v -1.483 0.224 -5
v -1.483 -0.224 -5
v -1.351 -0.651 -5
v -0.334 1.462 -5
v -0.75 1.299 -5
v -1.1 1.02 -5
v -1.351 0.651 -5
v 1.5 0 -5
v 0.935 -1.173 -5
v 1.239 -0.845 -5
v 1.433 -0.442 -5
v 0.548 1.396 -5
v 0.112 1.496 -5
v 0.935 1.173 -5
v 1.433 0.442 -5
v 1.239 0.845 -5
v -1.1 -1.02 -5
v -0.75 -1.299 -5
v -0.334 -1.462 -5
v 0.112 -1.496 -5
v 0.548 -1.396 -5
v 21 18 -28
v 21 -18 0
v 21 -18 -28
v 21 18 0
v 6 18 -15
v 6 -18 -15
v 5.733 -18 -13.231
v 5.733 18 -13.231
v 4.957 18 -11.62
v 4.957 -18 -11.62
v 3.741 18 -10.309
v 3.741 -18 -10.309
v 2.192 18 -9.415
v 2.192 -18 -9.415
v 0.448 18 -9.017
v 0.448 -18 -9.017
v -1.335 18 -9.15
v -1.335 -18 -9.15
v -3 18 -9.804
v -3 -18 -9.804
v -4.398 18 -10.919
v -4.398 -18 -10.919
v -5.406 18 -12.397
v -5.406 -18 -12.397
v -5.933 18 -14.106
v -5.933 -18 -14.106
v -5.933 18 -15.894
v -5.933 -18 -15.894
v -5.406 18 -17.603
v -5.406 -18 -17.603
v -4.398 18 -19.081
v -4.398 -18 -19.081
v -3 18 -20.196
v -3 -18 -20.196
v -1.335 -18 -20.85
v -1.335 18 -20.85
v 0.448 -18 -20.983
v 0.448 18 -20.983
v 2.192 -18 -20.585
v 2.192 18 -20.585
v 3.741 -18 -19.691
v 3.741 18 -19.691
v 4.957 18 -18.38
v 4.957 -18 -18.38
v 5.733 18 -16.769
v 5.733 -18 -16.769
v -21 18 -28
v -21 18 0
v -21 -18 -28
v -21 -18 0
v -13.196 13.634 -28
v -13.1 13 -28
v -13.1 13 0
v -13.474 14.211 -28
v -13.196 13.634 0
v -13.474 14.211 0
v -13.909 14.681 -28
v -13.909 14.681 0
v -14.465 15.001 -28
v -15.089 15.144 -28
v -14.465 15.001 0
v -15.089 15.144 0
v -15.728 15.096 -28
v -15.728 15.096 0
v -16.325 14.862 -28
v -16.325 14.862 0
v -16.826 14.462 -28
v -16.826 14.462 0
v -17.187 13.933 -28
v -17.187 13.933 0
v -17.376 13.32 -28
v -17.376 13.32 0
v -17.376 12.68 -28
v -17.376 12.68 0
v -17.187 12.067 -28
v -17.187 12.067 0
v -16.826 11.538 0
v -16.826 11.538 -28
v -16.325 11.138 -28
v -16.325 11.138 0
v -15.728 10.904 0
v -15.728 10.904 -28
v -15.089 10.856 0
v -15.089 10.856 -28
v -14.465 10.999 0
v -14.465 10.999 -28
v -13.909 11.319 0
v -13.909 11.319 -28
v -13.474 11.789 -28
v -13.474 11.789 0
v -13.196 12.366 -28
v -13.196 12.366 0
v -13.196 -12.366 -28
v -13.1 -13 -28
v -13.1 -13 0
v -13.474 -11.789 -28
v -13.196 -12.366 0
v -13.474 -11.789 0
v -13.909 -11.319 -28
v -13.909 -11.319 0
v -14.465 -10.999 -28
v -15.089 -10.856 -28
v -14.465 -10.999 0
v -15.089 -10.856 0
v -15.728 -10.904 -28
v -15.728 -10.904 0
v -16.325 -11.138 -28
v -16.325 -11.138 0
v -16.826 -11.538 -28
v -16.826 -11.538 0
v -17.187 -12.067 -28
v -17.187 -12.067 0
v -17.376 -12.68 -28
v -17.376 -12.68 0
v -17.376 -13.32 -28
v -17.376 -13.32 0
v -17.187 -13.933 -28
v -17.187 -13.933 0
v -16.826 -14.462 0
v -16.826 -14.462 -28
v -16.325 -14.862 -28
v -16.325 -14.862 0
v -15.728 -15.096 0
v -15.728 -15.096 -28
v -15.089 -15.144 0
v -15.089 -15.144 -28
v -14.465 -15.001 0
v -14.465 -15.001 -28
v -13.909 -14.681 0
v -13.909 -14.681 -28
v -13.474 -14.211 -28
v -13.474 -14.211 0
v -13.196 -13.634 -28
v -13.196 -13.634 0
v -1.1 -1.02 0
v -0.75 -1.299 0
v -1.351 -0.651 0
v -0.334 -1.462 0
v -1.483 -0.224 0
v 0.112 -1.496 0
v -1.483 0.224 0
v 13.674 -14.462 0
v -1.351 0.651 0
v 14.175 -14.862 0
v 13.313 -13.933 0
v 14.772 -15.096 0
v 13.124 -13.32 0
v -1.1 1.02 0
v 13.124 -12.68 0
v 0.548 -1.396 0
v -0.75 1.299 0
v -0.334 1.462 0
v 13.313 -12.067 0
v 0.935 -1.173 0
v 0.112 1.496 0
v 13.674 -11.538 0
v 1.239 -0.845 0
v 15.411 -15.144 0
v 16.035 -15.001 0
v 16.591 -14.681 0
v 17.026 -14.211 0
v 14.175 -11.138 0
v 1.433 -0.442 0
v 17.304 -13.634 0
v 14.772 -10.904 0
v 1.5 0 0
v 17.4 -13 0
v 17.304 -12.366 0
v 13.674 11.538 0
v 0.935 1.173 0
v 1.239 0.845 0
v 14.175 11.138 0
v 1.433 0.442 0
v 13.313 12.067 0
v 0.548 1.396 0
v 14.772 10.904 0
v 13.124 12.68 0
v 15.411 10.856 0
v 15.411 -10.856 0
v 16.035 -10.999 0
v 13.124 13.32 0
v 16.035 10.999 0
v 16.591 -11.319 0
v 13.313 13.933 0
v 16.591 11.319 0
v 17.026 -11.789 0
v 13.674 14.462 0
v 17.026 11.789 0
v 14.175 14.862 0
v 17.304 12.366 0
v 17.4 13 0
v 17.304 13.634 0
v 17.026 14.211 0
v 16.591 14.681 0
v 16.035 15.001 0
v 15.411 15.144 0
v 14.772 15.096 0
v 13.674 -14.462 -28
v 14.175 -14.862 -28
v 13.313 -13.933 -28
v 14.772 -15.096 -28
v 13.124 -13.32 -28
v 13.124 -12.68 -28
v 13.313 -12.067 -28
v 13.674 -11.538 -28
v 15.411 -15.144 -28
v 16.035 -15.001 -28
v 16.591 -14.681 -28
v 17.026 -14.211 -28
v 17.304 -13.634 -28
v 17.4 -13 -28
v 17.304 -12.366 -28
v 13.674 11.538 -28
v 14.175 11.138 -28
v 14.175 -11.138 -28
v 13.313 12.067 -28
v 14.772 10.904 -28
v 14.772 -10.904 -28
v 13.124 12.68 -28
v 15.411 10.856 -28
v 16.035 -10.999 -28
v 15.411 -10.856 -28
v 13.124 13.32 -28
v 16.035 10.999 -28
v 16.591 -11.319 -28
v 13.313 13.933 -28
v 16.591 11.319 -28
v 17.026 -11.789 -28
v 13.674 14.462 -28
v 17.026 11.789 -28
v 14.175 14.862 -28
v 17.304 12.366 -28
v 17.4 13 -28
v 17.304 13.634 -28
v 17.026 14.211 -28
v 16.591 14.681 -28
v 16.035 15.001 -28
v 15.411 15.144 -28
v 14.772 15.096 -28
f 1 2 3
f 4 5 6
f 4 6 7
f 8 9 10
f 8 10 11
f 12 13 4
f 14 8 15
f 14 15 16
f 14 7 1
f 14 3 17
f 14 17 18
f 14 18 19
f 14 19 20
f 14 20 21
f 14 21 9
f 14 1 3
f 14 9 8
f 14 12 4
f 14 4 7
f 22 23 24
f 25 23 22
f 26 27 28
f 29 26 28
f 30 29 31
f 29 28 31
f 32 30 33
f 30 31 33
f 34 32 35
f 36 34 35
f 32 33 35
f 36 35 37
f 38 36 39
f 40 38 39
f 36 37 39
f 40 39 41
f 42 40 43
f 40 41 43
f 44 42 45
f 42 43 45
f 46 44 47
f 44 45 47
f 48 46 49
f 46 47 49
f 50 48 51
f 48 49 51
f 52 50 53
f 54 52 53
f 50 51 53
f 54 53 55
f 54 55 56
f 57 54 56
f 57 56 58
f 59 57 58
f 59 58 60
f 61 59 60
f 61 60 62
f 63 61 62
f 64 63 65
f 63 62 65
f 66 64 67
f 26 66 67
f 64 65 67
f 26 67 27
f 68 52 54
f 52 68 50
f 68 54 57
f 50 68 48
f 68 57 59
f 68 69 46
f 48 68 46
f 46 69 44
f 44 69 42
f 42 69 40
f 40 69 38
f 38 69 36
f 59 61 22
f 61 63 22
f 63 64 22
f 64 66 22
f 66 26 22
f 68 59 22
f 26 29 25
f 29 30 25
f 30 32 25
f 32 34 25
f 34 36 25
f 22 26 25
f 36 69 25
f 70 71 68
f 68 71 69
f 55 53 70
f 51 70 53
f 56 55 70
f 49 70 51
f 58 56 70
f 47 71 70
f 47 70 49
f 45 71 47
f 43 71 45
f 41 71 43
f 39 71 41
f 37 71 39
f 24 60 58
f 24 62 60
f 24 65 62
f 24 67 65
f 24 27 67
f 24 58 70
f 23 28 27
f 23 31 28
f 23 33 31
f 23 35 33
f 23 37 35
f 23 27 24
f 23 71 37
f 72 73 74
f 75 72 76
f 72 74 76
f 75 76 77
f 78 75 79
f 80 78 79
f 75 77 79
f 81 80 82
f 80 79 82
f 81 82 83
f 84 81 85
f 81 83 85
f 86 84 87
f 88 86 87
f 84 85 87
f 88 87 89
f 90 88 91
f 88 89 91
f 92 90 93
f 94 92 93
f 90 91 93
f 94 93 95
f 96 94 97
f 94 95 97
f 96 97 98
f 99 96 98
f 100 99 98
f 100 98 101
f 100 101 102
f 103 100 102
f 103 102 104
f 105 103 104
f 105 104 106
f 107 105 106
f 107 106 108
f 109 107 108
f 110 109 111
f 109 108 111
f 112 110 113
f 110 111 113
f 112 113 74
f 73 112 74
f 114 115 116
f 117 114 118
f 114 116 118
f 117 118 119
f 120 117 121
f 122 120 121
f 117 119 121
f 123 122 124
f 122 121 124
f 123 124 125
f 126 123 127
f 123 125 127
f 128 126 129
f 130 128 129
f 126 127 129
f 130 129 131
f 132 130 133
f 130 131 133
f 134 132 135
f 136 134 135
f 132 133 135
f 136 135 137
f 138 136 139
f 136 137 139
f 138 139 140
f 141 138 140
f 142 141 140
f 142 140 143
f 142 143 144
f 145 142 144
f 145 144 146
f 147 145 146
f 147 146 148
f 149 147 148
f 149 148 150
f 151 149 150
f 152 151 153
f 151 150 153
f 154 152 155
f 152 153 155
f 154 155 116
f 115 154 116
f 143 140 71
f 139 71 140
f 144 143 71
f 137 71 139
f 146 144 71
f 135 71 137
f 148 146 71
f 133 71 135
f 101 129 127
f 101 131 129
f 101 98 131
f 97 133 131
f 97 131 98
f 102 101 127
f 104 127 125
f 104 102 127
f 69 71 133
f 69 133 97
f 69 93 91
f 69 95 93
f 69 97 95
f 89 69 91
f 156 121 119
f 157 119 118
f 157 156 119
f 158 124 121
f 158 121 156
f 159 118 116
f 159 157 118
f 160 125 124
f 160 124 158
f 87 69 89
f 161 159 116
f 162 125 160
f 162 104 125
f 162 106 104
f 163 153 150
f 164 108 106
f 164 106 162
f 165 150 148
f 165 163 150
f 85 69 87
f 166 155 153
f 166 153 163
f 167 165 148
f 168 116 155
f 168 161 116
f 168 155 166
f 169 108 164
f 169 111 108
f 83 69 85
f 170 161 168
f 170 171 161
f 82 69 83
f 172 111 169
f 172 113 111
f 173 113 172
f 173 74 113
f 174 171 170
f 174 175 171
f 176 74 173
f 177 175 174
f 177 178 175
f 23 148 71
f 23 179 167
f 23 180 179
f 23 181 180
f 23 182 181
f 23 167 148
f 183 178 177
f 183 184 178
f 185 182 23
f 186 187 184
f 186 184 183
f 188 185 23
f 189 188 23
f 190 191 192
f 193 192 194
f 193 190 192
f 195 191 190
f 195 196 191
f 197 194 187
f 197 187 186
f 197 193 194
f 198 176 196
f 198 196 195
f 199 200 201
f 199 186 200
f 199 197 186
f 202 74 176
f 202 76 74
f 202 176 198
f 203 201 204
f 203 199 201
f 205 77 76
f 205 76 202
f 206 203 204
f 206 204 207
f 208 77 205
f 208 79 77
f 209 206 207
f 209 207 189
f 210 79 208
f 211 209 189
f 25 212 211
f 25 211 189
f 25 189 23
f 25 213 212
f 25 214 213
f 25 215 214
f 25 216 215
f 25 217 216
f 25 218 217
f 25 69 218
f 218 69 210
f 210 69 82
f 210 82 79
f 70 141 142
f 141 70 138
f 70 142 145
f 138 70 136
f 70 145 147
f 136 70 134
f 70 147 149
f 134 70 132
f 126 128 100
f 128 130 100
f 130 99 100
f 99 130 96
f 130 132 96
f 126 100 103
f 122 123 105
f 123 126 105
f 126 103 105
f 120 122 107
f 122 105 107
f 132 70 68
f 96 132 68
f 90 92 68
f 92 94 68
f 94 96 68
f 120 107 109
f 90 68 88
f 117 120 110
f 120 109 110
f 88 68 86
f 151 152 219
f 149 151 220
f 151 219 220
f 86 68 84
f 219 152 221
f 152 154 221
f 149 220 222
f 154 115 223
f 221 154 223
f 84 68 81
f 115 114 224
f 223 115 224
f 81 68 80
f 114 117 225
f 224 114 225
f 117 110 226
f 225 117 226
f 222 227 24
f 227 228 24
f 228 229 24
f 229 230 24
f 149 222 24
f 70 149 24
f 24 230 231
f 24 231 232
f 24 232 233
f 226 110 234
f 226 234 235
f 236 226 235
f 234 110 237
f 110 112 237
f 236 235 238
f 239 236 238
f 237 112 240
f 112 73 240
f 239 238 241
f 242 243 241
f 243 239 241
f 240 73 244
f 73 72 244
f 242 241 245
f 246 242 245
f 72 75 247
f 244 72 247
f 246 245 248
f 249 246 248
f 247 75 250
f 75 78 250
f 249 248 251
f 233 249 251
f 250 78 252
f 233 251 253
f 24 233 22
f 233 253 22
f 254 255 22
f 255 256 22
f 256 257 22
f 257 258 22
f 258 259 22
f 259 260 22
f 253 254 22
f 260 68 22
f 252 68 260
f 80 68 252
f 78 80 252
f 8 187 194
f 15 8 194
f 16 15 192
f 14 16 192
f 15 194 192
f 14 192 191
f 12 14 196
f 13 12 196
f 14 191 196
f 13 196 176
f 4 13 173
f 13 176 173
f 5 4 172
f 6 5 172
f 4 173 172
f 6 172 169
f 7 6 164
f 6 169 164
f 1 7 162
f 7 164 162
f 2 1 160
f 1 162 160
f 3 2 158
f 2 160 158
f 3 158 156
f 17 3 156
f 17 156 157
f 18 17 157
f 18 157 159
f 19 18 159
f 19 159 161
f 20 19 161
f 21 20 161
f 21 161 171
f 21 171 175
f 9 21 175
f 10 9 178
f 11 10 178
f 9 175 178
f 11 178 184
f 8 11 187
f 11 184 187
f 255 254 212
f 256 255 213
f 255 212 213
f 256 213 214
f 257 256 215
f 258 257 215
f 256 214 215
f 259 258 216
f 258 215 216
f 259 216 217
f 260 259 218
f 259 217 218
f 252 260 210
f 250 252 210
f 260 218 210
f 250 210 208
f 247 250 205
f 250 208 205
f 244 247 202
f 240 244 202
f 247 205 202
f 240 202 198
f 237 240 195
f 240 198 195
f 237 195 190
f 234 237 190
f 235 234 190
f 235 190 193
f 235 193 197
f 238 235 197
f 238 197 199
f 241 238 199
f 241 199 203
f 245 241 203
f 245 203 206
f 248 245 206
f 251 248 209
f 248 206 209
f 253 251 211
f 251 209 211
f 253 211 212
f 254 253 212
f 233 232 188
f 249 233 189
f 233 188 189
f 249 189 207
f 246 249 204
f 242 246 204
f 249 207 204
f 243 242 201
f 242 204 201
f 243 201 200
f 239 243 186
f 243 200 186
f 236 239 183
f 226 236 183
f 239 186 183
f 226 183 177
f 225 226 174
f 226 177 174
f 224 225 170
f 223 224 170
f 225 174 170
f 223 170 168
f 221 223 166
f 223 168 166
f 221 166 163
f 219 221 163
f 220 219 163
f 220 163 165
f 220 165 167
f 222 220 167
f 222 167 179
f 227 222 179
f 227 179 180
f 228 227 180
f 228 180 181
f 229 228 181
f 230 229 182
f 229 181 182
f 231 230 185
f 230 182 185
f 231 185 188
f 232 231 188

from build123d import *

# Parameters (mm, degrees)
F0_W     = 42
F0_H     = 36
F0_R     = 2.15
F1_DEPTH = 28
F2_R     = 6
F3_DEPTH = 36
F4_R     = 1.5
F5_DEPTH = 5


with BuildPart() as f1:
    # F0 (on Top) → F1 (new body)
    with BuildSketch(Plane.XY):
        Rectangle(F0_W, F0_H)
        with Locations((-15.25, -13)):
            Circle(F0_R, mode=Mode.SUBTRACT)
        with Locations((15.25, -13)):
            Circle(F0_R, mode=Mode.SUBTRACT)
        with Locations((-15.25, 13)):
            Circle(F0_R, mode=Mode.SUBTRACT)
        with Locations((15.25, 13)):
            Circle(F0_R, mode=Mode.SUBTRACT)
    extrude(amount=-F1_DEPTH)

    # F2 (on face) → F3 (cut)
    with BuildSketch(Plane.XZ.offset(18)):
        with Locations((0, -15)):
            Circle(F2_R)
    extrude(amount=-F3_DEPTH, mode=Mode.SUBTRACT)

    # F4 (on face) → F5 (cut)
    with BuildSketch(Plane.XY):
        Circle(F4_R)
    extrude(amount=-F5_DEPTH, mode=Mode.SUBTRACT)


solid = f1.part
